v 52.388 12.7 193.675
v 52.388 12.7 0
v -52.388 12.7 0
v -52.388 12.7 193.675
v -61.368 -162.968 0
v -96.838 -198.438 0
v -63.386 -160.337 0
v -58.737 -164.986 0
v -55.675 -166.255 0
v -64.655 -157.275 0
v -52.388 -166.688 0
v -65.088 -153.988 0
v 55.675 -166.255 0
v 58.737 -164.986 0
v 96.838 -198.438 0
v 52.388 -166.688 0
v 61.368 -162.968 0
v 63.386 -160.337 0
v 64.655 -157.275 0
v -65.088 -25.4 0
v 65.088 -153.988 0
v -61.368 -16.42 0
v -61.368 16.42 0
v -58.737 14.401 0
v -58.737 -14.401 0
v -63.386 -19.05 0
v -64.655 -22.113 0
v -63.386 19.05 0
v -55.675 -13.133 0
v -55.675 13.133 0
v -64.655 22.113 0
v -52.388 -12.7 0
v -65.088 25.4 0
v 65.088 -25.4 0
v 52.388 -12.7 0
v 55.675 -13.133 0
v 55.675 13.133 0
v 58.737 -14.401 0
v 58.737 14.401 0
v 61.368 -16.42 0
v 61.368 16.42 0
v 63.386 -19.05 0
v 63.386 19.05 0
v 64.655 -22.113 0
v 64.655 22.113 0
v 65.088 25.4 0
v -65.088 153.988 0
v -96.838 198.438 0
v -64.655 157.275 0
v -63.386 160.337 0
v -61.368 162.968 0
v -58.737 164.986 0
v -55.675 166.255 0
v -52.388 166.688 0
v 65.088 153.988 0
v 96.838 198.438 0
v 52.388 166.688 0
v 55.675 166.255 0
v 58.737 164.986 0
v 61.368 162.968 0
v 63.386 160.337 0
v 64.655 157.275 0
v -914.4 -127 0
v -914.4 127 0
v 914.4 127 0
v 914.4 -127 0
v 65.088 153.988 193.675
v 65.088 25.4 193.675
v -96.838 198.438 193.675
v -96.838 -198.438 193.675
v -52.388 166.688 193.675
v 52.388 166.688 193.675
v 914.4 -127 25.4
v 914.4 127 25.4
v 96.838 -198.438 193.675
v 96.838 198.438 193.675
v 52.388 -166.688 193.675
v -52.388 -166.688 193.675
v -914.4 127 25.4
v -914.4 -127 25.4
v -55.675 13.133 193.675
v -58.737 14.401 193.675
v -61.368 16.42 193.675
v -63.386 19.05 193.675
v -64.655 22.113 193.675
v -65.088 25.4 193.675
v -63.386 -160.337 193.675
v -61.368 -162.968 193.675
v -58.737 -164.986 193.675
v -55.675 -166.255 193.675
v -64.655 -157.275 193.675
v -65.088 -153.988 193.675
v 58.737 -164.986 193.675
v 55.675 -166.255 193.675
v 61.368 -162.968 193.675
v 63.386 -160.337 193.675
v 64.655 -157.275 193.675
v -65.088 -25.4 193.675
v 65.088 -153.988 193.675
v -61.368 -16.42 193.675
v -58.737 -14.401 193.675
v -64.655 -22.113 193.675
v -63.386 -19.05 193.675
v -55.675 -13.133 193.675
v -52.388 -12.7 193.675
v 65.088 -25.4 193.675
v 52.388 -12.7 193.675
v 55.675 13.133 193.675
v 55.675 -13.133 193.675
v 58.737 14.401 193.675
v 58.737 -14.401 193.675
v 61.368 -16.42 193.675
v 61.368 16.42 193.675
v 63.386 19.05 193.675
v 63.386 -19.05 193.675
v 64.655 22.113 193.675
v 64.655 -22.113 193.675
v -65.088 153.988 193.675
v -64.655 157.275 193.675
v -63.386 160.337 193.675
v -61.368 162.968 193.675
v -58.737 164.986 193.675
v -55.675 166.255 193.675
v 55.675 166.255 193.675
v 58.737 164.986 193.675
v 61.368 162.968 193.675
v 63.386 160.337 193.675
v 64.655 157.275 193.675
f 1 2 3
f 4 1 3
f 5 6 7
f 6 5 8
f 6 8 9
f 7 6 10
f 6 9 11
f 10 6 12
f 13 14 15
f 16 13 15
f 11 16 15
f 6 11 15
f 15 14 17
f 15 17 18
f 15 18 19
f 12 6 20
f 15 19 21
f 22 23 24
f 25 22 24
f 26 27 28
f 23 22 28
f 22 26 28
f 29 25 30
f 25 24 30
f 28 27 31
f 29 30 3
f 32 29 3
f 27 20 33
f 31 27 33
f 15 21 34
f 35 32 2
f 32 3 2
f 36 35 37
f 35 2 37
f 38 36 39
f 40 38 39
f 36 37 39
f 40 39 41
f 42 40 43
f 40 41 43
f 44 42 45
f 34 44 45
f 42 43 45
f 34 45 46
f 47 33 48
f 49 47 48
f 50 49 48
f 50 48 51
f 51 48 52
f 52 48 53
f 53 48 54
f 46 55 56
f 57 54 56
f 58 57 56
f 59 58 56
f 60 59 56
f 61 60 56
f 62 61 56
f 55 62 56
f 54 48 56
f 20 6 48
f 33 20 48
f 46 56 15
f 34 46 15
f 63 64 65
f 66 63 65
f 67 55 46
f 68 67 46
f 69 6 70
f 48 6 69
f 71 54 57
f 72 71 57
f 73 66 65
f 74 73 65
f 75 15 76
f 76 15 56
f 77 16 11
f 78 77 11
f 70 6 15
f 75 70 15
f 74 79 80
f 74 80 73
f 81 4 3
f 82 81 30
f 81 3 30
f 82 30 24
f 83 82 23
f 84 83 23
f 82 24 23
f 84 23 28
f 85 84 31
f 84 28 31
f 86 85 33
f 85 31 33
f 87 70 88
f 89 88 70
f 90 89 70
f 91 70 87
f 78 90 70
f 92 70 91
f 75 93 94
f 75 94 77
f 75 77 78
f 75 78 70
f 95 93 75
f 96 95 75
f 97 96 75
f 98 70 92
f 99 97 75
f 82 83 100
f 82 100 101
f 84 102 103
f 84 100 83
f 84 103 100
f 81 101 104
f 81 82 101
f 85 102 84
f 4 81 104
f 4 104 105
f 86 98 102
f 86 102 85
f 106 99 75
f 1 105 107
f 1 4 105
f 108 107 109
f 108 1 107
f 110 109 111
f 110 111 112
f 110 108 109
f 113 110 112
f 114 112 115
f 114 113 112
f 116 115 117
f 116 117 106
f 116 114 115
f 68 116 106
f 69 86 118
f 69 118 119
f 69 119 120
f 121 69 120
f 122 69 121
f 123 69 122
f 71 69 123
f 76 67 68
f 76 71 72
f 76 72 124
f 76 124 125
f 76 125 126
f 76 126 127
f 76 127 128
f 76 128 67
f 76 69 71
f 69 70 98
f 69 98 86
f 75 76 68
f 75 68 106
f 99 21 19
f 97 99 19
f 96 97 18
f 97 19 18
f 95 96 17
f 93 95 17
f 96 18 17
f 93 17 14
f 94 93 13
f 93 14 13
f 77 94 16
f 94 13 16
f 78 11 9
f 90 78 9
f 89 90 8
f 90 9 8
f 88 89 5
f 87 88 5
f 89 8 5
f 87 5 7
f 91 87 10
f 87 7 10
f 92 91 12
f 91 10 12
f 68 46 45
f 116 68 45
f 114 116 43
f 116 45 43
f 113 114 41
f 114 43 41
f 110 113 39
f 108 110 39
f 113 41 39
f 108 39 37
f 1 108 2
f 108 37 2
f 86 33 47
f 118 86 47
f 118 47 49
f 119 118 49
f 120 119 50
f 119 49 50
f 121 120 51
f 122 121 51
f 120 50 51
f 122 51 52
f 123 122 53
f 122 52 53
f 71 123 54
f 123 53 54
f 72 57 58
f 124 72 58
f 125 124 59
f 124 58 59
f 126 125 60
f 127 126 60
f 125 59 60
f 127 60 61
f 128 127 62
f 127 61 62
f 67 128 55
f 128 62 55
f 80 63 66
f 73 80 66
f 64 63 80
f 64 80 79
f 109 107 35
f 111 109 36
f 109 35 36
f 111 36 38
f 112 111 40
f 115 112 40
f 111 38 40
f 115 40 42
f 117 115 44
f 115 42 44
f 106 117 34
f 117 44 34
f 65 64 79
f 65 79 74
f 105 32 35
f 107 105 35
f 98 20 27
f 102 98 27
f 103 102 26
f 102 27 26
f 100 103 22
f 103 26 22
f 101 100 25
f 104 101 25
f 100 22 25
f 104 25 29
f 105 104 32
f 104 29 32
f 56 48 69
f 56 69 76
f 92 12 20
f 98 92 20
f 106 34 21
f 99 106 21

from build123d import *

# Parameters (mm, degrees)
F0_W     = 1828.8
F0_H     = 254
F1_DEPTH = 25.4
F2_W     = 193.675
F2_H     = 396.875
F3_DEPTH = 193.675


with BuildPart() as f1:
    # F0 (on Top) → F1 (new body)
    with BuildSketch(Plane.XY):
        Rectangle(F0_W, F0_H)
    extrude(amount=F1_DEPTH)


with BuildPart() as f3:
    # F2 (on Top) → F3 (new body)
    with BuildSketch(Plane.XY):
        Rectangle(F2_W, F2_H)
        with BuildLine():
            Line((-52.3875, -12.7), (52.3875, -12.7))
            ThreePointArc((52.3875, -12.7), (61.367756, -16.419744), (65.0875, -25.4))
            Line((65.0875, -25.4), (65.0875, -153.9875))
            ThreePointArc((65.0875, -153.9875), (61.367756, -162.967756), (52.3875, -166.6875))
            Line((52.3875, -166.6875), (-52.3875, -166.6875))
            ThreePointArc((-52.3875, -166.6875), (-61.367756, -162.967756), (-65.0875, -153.9875))
            Line((-65.0875, -153.9875), (-65.0875, -25.4))
            ThreePointArc((-65.0875, -25.4), (-61.367756, -16.419744), (-52.3875, -12.7))
        make_face(mode=Mode.SUBTRACT)
        with BuildLine():
            ThreePointArc((65.0875, 25.4), (61.367756, 16.419744), (52.3875, 12.7))
            Line((52.3875, 12.7), (-52.3875, 12.7))
            ThreePointArc((-52.3875, 12.7), (-61.367756, 16.419744), (-65.0875, 25.4))
            Line((-65.0875, 25.4), (-65.0875, 153.9875))
            ThreePointArc((-65.0875, 153.9875), (-61.367756, 162.967756), (-52.3875, 166.6875))
            Line((-52.3875, 166.6875), (52.3875, 166.6875))
            ThreePointArc((52.3875, 166.6875), (61.367756, 162.967756), (65.0875, 153.9875))
            Line((65.0875, 153.9875), (65.0875, 25.4))
        make_face(mode=Mode.SUBTRACT)
    extrude(amount=F3_DEPTH)


solid = Compound([f1.part, f3.part])
